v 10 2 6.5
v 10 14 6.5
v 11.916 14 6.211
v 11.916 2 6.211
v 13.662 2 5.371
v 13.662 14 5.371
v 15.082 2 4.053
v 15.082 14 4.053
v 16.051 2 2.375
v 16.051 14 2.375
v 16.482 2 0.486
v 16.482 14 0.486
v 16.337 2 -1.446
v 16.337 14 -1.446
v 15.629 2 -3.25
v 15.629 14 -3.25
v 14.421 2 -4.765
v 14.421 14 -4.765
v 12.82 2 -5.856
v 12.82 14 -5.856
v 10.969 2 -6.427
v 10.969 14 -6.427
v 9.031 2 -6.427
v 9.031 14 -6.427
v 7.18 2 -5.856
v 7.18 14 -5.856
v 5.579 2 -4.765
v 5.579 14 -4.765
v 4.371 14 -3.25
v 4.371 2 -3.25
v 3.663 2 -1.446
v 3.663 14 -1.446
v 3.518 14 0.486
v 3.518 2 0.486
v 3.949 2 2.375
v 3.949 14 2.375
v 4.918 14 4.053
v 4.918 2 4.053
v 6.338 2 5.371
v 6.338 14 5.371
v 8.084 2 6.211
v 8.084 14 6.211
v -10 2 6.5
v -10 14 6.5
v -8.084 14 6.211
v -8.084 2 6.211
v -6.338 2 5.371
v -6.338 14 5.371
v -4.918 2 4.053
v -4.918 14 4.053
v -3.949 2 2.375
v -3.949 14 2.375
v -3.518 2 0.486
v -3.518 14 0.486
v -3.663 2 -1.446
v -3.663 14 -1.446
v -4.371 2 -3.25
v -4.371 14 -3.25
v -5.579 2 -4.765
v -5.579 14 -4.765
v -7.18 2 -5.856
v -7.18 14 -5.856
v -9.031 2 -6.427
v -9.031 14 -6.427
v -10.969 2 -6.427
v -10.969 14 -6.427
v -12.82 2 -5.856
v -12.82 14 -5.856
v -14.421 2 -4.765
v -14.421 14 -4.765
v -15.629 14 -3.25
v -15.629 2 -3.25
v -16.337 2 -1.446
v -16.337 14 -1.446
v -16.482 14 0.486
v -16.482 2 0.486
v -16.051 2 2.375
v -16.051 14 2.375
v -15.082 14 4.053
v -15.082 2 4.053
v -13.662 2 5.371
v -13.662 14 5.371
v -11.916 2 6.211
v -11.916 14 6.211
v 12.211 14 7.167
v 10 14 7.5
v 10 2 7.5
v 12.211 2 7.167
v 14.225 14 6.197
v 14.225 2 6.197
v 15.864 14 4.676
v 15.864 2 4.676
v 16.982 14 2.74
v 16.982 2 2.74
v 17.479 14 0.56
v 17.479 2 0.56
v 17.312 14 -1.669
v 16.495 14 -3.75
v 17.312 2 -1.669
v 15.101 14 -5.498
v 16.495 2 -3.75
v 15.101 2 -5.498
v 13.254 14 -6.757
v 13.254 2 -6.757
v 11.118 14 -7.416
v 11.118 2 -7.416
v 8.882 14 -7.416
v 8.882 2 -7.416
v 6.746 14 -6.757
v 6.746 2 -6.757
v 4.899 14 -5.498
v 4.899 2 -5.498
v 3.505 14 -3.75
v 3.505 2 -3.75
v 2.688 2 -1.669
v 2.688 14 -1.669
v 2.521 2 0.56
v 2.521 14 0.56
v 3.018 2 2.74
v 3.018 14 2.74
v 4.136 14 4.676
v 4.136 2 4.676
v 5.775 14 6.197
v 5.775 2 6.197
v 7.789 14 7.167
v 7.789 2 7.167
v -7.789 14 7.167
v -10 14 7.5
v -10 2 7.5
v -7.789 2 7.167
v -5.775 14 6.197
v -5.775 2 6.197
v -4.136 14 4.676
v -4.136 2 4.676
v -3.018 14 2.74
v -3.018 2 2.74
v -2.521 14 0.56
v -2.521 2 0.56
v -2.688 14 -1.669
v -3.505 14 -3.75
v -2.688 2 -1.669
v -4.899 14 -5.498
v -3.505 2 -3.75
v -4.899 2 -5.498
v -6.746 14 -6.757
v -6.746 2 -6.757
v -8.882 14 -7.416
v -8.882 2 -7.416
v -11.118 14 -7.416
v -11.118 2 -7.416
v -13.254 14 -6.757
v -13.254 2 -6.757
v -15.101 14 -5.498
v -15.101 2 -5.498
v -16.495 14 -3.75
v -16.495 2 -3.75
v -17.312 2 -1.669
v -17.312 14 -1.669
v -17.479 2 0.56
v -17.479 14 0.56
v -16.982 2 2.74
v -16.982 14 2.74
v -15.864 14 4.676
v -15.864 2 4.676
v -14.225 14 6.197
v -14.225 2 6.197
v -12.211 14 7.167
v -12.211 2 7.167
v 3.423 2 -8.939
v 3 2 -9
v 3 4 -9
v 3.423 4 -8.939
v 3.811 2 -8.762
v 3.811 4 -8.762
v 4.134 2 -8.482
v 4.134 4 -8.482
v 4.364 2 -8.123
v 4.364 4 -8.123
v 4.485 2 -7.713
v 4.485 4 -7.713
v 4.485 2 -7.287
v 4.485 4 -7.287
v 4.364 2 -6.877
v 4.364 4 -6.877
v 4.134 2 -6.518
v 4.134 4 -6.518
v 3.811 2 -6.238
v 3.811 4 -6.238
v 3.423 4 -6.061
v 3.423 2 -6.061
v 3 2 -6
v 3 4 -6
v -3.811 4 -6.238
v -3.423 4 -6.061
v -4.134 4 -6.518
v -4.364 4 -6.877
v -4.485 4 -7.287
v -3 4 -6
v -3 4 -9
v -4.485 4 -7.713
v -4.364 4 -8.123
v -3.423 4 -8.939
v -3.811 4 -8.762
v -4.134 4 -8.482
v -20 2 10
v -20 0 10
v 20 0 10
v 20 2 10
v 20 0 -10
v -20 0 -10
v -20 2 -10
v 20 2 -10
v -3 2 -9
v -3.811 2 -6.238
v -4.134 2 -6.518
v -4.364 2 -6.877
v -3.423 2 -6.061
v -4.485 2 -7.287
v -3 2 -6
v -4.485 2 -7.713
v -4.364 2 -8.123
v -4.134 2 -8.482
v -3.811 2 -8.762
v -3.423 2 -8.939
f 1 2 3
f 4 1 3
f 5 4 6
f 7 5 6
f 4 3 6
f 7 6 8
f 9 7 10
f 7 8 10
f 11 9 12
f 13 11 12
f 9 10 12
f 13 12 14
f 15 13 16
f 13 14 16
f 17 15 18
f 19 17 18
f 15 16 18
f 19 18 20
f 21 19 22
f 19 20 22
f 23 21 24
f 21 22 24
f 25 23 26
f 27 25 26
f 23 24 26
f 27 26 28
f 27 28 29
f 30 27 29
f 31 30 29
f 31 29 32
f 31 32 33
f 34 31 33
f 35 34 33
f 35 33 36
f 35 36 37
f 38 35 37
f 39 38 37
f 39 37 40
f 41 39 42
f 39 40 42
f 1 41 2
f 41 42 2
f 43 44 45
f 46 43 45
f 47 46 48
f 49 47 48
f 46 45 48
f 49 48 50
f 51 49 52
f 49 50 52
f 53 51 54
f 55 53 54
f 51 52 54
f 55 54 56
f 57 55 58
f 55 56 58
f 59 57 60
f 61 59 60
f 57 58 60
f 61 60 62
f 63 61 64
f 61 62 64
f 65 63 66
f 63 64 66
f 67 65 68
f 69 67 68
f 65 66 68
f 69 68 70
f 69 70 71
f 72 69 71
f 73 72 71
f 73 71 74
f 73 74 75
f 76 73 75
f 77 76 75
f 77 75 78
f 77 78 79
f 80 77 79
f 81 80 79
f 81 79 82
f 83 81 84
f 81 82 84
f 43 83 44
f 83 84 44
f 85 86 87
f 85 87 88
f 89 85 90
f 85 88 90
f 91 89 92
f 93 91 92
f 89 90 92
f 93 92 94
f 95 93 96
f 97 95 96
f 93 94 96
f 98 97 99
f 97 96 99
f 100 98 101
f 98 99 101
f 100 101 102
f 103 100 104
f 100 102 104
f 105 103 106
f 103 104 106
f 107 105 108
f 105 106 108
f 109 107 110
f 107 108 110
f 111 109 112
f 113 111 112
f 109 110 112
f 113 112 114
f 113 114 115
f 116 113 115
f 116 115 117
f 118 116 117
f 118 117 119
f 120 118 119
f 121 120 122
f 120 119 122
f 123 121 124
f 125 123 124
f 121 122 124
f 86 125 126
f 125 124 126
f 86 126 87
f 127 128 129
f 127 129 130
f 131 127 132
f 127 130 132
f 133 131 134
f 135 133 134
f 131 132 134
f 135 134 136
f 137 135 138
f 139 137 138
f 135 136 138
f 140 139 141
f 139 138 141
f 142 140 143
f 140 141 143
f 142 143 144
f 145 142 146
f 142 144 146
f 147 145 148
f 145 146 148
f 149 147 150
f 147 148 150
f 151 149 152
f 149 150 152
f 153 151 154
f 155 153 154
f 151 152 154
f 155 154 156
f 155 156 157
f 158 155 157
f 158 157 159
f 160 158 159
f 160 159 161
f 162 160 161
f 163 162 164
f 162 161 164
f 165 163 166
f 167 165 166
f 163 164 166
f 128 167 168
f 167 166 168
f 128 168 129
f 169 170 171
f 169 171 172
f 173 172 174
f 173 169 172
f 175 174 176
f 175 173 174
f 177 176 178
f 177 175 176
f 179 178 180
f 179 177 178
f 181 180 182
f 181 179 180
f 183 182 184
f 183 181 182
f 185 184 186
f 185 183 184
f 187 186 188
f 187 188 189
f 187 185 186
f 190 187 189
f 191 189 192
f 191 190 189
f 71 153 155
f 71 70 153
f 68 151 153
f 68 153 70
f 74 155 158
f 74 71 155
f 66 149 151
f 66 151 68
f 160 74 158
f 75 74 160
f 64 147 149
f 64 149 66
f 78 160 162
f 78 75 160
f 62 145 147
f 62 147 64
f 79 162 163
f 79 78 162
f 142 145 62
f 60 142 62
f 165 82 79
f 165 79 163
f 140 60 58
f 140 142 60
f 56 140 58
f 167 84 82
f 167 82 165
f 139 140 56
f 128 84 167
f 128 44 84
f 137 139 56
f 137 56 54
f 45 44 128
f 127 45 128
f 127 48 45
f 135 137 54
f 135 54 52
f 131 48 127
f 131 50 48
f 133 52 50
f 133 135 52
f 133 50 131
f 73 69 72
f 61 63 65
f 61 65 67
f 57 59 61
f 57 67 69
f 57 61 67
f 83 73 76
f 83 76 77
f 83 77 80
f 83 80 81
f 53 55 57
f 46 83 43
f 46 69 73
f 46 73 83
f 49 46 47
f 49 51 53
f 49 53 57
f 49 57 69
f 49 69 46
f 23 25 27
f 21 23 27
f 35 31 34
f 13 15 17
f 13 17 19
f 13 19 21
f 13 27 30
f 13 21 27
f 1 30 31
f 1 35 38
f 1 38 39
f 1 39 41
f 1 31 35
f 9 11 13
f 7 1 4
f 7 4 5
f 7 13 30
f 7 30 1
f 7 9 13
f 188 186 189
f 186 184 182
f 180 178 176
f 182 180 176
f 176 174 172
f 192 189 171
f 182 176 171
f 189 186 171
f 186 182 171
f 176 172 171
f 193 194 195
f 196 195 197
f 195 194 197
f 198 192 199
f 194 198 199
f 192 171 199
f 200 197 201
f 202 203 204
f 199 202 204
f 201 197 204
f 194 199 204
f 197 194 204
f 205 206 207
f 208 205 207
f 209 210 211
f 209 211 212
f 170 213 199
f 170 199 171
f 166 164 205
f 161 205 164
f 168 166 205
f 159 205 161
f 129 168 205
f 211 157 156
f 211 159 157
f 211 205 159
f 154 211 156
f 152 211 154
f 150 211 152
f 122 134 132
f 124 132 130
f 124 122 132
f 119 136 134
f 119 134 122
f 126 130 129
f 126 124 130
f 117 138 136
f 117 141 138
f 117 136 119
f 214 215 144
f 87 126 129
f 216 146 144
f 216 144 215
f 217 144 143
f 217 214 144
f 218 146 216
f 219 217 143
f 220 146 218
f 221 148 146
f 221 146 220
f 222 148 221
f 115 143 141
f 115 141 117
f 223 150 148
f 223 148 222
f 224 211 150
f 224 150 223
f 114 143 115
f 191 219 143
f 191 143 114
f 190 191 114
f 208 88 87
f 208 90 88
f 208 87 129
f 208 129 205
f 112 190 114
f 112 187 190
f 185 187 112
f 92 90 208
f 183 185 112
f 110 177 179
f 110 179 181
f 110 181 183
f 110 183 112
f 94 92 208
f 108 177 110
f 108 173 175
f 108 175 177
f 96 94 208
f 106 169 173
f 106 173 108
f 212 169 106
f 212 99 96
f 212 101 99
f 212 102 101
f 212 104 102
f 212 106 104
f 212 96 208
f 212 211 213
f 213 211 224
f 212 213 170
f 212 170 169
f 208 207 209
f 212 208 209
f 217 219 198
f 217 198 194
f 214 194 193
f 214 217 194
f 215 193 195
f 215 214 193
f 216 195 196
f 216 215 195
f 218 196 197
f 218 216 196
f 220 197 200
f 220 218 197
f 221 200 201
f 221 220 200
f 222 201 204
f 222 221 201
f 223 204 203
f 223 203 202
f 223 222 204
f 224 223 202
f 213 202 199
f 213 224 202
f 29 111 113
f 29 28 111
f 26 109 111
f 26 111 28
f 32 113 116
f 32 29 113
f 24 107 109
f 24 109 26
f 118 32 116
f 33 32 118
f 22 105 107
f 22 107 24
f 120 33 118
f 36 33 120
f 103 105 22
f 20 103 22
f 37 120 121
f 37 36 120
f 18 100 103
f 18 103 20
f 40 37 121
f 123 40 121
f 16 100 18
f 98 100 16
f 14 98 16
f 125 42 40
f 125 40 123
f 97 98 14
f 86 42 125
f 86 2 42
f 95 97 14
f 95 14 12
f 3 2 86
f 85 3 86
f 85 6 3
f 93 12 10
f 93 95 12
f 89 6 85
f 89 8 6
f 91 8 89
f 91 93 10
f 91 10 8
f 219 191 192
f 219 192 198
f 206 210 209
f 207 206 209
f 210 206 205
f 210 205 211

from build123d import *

# Parameters (mm, degrees)
SKETCH1_W           = 40
SKETCH1_H           = 20
BOSS_EXTRUDE1_DEPTH = 2
SKETCH2_R           = 7.5
BOSS_EXTRUDE2_DEPTH = 12
SKETCH3_R           = 6.5
CUT_EXTRUDE1_DEPTH  = 12
SKETCH7_R           = 6.5
CUT_EXTRUDE2_DEPTH  = 12
BOSS_EXTRUDE3_DEPTH = 2


with BuildPart() as part:
    # Sketch1 → Boss-Extrude1 (new body)
    with BuildSketch(Plane(origin=(0, 0, 0), x_dir=(1, 0, 0), z_dir=(0, 1, 0))):
        Rectangle(SKETCH1_W, SKETCH1_H)
    extrude(amount=BOSS_EXTRUDE1_DEPTH)

    # Sketch2 → Boss-Extrude2 (add)
    with BuildSketch(Plane(origin=(0, 2, 0), x_dir=(1, 0, 0), z_dir=(0, 1, 0))):
        with Locations(Location((-10, 0, 0), (0, 0, 270))):
            Circle(SKETCH2_R)
        with Locations(Location((10, 0, 0), (0, 0, 270))):
            Circle(SKETCH2_R)
    extrude(amount=BOSS_EXTRUDE2_DEPTH)

    # Sketch3 → Cut-Extrude1 (cut)
    with BuildSketch(Plane(origin=(0, 14, 0), x_dir=(1, 0, 0), z_dir=(0, 1, 0))):
        with Locations(Location((-10, 0, 0), (0, 0, 270))):
            Circle(SKETCH3_R)
    extrude(amount=-CUT_EXTRUDE1_DEPTH, mode=Mode.SUBTRACT)

    # Sketch7 → Cut-Extrude2 (cut)
    with BuildSketch(Plane(origin=(0, 14, 0), x_dir=(1, 0, 0), z_dir=(0, 1, 0))):
        with Locations(Location((10, 0, 0), (0, 0, 270))):
            Circle(SKETCH7_R)
    extrude(amount=-CUT_EXTRUDE2_DEPTH, mode=Mode.SUBTRACT)

    # Sketch9 → Boss-Extrude3 (add)
    with BuildSketch(Plane(origin=(0, 2, 0), x_dir=(1, 0, 0), z_dir=(0, 1, 0))):
        with BuildLine():
            Line((-3, 9), (3, 9))
            ThreePointArc((3, 9), (4.5, 7.5), (3, 6))
            Line((3, 6), (-3, 6))
            ThreePointArc((-3, 6), (-4.5, 7.5), (-3, 9))
        make_face()
    extrude(amount=BOSS_EXTRUDE3_DEPTH)


solid = part.part
